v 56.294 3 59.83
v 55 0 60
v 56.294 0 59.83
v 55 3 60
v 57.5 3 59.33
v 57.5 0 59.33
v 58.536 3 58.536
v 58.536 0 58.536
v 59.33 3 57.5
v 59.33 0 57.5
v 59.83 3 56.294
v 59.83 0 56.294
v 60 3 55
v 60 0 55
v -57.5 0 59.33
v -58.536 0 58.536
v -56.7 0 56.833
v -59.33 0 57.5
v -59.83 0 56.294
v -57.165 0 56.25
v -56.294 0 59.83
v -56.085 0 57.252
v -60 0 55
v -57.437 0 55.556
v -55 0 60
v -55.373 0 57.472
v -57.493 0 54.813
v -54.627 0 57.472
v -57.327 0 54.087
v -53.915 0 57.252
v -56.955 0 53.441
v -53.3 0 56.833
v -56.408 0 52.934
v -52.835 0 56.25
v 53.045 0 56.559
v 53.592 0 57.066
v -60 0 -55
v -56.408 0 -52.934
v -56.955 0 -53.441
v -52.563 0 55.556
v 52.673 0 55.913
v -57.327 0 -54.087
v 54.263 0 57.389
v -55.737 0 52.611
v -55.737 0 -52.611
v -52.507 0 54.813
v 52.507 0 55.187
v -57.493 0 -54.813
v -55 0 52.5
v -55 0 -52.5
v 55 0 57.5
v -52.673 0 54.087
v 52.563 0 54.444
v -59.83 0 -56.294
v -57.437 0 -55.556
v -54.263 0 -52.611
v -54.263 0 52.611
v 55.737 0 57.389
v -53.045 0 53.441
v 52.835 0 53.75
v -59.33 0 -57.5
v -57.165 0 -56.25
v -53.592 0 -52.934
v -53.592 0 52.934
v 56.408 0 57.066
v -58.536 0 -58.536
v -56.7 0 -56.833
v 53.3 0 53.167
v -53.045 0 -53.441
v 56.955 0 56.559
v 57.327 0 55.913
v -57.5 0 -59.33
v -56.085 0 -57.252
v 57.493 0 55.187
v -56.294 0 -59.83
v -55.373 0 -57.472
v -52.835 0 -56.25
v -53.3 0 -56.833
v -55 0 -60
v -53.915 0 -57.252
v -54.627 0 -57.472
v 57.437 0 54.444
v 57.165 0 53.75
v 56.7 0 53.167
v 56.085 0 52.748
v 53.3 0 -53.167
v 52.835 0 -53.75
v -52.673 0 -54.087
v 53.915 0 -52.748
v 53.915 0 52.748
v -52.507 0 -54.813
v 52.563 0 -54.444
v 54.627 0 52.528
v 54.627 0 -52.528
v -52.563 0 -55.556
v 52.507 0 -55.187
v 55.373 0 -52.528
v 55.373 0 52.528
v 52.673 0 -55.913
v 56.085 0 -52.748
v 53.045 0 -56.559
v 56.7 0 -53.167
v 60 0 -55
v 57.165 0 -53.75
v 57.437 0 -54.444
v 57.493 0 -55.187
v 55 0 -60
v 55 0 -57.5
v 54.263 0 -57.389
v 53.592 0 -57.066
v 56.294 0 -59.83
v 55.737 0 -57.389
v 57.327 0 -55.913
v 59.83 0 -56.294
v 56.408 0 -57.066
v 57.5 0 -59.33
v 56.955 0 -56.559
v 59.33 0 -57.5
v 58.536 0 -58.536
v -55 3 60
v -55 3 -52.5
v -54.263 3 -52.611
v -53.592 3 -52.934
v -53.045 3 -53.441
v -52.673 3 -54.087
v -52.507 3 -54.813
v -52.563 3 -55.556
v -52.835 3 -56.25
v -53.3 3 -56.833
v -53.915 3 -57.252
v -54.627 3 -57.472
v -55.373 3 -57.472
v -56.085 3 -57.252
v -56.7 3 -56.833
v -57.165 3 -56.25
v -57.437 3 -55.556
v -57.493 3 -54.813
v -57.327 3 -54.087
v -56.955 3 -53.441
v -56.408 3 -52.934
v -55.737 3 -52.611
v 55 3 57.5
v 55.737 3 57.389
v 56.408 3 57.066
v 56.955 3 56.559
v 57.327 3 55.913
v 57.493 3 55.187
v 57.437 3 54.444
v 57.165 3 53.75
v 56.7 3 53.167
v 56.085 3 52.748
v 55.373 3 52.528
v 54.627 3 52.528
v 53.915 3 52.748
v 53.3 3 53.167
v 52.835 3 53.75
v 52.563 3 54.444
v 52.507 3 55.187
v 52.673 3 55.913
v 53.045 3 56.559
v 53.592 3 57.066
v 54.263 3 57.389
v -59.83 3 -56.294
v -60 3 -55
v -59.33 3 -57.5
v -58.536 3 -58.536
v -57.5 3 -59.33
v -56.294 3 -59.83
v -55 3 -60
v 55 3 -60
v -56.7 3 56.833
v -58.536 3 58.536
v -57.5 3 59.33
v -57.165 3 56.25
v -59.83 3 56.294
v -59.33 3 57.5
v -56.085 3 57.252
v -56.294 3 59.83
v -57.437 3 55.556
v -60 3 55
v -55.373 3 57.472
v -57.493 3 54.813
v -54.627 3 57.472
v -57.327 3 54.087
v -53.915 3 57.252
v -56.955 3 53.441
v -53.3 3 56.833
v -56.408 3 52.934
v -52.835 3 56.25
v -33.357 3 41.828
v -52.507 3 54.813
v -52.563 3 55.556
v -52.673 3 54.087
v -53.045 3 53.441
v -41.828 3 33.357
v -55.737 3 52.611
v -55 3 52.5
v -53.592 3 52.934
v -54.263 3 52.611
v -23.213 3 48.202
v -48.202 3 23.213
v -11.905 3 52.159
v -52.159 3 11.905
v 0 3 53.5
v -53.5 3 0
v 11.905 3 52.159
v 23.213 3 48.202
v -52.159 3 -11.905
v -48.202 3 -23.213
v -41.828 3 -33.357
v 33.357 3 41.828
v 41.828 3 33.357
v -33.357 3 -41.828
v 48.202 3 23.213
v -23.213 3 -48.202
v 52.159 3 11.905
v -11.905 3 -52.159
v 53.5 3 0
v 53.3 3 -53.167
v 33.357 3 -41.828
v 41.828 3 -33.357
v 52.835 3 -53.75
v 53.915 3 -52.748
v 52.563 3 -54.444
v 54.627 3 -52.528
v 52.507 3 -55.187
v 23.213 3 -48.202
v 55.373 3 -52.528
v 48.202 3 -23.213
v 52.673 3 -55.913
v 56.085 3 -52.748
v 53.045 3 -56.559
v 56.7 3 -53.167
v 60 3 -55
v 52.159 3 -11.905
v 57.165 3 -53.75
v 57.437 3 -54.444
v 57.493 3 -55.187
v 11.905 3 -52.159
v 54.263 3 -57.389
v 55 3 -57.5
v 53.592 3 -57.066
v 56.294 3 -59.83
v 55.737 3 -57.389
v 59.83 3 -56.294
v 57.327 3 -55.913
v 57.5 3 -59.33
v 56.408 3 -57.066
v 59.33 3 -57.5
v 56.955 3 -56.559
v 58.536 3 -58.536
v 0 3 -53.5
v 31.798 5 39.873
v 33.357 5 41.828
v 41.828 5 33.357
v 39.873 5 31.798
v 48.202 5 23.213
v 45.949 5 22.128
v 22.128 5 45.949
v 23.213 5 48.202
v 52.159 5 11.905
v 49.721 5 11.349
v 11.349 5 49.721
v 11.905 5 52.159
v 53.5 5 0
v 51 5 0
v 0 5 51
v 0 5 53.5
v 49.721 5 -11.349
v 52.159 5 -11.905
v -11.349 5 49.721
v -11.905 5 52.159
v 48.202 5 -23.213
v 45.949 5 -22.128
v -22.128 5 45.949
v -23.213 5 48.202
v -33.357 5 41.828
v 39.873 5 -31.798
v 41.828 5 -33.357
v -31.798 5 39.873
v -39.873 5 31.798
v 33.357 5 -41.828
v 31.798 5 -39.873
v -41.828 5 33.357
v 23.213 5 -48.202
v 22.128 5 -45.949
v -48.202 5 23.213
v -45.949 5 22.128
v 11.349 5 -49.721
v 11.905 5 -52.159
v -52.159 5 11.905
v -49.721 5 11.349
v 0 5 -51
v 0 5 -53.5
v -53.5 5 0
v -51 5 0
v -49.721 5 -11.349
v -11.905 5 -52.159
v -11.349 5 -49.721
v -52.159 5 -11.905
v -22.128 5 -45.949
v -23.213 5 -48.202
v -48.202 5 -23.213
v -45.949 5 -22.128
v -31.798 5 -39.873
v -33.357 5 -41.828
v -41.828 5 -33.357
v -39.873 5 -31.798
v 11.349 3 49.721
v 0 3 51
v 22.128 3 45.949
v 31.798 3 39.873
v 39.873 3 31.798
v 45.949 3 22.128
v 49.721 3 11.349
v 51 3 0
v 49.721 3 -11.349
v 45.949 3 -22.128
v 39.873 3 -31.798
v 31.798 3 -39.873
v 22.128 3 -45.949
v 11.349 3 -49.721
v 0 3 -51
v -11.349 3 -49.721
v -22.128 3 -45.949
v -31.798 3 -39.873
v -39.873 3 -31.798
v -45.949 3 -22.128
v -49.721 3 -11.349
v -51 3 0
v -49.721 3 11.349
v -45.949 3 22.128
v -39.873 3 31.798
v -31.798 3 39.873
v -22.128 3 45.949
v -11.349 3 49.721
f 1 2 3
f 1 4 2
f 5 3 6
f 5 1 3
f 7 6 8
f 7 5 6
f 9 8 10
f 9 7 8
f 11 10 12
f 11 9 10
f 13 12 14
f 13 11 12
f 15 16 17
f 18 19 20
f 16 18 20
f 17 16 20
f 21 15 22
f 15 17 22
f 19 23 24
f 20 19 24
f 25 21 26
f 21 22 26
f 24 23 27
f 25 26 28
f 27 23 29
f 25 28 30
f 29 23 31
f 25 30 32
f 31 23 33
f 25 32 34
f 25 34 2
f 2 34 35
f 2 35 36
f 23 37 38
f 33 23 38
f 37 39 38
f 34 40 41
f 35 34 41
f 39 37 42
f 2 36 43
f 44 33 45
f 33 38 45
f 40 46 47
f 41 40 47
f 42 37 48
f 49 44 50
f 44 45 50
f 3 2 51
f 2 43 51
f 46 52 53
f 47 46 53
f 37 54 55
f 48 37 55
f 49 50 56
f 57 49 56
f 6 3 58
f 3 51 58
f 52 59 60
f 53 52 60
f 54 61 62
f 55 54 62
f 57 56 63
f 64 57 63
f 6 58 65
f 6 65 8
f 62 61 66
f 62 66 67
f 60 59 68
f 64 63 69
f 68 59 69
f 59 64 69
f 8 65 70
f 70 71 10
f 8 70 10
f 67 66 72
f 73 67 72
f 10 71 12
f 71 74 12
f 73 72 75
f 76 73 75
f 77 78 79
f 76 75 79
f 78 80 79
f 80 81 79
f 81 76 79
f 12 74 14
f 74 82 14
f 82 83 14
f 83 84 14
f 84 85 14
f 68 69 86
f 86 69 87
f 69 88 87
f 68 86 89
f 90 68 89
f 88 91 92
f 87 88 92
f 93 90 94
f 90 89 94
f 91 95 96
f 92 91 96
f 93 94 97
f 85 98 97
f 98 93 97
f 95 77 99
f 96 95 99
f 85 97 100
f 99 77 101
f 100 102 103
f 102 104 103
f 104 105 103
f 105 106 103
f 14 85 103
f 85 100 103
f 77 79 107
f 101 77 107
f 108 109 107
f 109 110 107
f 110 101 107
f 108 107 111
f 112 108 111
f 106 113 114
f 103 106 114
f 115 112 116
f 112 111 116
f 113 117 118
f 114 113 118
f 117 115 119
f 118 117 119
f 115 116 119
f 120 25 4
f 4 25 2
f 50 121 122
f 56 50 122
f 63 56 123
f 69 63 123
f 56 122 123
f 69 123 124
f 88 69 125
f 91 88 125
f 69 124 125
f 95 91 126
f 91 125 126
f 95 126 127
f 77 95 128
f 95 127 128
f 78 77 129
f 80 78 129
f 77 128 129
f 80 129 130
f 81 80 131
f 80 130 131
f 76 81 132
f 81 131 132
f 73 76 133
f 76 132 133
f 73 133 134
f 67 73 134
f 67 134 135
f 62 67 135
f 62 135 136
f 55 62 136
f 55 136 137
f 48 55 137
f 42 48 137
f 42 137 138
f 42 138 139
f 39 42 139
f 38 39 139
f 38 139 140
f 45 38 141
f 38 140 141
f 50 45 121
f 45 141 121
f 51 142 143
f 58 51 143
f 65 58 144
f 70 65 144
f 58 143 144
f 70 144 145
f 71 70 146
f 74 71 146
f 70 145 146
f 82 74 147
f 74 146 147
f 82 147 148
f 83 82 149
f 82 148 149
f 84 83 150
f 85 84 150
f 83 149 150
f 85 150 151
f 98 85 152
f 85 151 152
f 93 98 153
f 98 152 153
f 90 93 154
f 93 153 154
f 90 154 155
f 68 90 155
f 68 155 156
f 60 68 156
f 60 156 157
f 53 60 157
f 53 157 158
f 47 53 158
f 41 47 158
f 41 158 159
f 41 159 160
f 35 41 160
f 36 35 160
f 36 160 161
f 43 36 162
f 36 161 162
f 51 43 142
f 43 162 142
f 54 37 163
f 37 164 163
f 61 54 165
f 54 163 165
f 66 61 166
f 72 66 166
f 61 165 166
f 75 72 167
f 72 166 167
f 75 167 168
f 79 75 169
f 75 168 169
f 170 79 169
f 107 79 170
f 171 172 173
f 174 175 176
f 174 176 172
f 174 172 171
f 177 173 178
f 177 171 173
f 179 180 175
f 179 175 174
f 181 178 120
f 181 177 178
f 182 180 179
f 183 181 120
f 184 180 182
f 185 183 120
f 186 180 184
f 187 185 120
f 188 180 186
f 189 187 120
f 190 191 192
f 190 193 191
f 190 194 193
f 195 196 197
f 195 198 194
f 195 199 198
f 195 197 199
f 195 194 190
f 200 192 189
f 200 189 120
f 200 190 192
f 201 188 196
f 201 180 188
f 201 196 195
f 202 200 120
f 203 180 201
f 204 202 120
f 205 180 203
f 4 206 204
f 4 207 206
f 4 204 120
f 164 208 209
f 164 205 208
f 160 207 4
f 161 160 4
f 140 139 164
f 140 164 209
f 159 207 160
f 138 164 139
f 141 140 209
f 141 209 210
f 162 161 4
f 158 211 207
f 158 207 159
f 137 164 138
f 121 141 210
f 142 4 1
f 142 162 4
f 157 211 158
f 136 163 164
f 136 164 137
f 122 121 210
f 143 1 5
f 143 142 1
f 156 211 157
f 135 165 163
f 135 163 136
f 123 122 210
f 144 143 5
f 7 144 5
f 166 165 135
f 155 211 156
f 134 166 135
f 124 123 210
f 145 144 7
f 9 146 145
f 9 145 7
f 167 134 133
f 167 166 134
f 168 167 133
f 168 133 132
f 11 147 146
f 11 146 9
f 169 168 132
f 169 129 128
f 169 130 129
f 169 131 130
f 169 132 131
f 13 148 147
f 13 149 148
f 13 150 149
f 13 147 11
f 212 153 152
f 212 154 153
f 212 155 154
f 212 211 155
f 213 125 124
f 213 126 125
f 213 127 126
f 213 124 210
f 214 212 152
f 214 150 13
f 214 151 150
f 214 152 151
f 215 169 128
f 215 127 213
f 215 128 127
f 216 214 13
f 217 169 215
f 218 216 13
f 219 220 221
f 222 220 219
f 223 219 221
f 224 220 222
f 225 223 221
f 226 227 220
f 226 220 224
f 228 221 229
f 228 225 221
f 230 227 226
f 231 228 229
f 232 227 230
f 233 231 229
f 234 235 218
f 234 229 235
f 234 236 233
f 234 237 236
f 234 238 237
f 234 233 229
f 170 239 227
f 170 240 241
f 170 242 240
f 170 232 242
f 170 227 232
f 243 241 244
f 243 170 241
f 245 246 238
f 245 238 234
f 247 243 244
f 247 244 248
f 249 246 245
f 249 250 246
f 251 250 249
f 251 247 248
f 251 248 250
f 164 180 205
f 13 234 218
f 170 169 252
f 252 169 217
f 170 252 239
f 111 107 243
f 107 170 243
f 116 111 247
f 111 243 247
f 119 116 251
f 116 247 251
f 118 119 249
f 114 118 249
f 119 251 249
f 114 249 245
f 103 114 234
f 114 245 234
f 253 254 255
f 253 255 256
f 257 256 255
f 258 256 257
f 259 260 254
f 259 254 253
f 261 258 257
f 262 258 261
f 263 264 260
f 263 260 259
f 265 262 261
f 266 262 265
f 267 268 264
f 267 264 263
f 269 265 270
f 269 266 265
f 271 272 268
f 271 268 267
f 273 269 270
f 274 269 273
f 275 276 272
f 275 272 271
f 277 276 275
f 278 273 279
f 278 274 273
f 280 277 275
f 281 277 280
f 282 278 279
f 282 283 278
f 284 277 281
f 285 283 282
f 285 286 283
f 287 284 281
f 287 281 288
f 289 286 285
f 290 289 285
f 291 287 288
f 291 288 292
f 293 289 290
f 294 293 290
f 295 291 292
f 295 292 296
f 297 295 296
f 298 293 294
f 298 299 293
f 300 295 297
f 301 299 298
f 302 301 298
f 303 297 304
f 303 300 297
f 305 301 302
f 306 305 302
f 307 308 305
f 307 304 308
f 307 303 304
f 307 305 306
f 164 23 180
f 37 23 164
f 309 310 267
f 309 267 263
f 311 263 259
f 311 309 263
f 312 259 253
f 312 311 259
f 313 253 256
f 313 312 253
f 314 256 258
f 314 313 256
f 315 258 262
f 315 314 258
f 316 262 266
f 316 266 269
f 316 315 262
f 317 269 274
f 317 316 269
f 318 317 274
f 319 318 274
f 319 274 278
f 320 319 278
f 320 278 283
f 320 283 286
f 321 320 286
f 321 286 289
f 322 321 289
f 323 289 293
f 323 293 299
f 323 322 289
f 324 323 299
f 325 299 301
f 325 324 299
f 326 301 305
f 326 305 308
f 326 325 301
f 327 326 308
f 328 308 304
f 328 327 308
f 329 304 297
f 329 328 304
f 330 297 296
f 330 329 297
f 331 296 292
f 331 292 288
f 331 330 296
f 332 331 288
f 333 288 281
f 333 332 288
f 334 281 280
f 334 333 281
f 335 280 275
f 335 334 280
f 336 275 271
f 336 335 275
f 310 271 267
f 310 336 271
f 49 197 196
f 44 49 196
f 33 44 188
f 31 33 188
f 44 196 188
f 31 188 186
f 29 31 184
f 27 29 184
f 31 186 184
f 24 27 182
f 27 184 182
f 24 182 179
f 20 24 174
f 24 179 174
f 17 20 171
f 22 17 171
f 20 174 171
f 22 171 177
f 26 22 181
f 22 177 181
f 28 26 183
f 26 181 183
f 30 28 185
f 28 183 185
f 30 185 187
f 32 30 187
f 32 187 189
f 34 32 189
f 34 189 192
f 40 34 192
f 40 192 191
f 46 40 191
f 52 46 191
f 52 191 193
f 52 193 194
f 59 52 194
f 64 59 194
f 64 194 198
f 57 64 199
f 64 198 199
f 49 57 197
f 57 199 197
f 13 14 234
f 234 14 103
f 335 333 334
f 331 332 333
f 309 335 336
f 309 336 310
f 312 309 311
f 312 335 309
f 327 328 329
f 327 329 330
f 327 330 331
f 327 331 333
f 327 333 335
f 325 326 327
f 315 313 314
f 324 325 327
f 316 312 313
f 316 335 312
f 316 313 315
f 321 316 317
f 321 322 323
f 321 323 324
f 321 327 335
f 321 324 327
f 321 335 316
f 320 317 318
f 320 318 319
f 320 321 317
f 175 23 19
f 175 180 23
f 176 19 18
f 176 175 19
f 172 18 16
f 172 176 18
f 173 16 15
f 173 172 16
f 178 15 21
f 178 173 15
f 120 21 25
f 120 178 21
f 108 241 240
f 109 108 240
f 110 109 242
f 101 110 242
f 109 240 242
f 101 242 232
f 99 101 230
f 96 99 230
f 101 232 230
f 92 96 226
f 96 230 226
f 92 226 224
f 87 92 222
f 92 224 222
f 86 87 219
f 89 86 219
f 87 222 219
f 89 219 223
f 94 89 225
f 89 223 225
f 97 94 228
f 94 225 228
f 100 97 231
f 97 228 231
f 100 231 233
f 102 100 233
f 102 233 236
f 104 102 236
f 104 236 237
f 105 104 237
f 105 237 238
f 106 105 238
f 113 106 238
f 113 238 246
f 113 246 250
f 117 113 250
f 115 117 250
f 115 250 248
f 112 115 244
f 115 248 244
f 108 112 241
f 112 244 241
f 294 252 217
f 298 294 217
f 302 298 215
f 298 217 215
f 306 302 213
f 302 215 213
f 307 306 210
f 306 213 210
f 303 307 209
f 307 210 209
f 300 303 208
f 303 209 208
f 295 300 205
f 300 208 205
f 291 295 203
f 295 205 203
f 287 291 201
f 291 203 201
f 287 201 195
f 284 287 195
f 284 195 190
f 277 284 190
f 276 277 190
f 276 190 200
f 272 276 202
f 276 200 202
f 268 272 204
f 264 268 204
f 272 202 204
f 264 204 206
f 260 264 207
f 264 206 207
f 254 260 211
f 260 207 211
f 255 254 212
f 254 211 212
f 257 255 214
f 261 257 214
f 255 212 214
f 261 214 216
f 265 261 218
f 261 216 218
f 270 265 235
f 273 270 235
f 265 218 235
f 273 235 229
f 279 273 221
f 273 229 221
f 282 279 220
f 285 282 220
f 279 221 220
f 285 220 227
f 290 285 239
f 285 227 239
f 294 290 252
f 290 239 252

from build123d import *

# Parameters (mm, degrees)
SKETCH1_W           = 120
SKETCH1_H           = 120
BOSS_EXTRUDE1_DEPTH = 3
SKETCH2_R           = 53.5
SKETCH2_R_2         = 51
BOSS_EXTRUDE2_DEPTH = 2
SKETCH3_R           = 2.5
CUT_EXTRUDE1_DEPTH  = 3
FILLET2_R           = 5


with BuildPart() as part:
    # Sketch1 → Boss-Extrude1 (new body)
    with BuildSketch(Plane(origin=(0, 0, 0), x_dir=(1, 0, 0), z_dir=(0, 1, 0))):
        Rectangle(SKETCH1_W, SKETCH1_H)
    extrude(amount=BOSS_EXTRUDE1_DEPTH)

    # Sketch2 → Boss-Extrude2 (add)
    with BuildSketch(Plane(origin=(0, 3, 0), x_dir=(1, 0, 0), z_dir=(0, 1, 0))):
        with Locations(Location((0, 0, 0), (0, 0, 90))):
            Circle(SKETCH2_R)
        with Locations(Location((0, 0, 0), (0, 0, 270))):
            Circle(SKETCH2_R_2, mode=Mode.SUBTRACT)
    extrude(amount=BOSS_EXTRUDE2_DEPTH)

    # Sketch3 → Cut-Extrude1 (cut)
    with BuildSketch(Plane(origin=(0, 3, 0), x_dir=(1, 0, 0), z_dir=(0, 1, 0))):
        with Locations(Location((-55, 55, 0), (0, 0, 270))):
            Circle(SKETCH3_R)
        with Locations(Location((55, 55, 0), (0, 0, 90))):
            Circle(SKETCH3_R)
        with Locations(Location((-55, -55, 0), (0, 0, 90))):
            Circle(SKETCH3_R)
        with Locations(Location((55, -55, 0), (0, 0, 270))):
            Circle(SKETCH3_R)
    extrude(amount=-CUT_EXTRUDE1_DEPTH, mode=Mode.SUBTRACT)

    # Fillet2
    fillet2_edges = [part.edges().sort_by_distance(p)[0] for p in [
        (60, 1.5, 60),
        (-60, 1.5, 60),
        (-60, 1.5, -60),
        (60, 1.5, -60),
    ]]
    fillet(fillet2_edges, radius=FILLET2_R)


solid = part.part
